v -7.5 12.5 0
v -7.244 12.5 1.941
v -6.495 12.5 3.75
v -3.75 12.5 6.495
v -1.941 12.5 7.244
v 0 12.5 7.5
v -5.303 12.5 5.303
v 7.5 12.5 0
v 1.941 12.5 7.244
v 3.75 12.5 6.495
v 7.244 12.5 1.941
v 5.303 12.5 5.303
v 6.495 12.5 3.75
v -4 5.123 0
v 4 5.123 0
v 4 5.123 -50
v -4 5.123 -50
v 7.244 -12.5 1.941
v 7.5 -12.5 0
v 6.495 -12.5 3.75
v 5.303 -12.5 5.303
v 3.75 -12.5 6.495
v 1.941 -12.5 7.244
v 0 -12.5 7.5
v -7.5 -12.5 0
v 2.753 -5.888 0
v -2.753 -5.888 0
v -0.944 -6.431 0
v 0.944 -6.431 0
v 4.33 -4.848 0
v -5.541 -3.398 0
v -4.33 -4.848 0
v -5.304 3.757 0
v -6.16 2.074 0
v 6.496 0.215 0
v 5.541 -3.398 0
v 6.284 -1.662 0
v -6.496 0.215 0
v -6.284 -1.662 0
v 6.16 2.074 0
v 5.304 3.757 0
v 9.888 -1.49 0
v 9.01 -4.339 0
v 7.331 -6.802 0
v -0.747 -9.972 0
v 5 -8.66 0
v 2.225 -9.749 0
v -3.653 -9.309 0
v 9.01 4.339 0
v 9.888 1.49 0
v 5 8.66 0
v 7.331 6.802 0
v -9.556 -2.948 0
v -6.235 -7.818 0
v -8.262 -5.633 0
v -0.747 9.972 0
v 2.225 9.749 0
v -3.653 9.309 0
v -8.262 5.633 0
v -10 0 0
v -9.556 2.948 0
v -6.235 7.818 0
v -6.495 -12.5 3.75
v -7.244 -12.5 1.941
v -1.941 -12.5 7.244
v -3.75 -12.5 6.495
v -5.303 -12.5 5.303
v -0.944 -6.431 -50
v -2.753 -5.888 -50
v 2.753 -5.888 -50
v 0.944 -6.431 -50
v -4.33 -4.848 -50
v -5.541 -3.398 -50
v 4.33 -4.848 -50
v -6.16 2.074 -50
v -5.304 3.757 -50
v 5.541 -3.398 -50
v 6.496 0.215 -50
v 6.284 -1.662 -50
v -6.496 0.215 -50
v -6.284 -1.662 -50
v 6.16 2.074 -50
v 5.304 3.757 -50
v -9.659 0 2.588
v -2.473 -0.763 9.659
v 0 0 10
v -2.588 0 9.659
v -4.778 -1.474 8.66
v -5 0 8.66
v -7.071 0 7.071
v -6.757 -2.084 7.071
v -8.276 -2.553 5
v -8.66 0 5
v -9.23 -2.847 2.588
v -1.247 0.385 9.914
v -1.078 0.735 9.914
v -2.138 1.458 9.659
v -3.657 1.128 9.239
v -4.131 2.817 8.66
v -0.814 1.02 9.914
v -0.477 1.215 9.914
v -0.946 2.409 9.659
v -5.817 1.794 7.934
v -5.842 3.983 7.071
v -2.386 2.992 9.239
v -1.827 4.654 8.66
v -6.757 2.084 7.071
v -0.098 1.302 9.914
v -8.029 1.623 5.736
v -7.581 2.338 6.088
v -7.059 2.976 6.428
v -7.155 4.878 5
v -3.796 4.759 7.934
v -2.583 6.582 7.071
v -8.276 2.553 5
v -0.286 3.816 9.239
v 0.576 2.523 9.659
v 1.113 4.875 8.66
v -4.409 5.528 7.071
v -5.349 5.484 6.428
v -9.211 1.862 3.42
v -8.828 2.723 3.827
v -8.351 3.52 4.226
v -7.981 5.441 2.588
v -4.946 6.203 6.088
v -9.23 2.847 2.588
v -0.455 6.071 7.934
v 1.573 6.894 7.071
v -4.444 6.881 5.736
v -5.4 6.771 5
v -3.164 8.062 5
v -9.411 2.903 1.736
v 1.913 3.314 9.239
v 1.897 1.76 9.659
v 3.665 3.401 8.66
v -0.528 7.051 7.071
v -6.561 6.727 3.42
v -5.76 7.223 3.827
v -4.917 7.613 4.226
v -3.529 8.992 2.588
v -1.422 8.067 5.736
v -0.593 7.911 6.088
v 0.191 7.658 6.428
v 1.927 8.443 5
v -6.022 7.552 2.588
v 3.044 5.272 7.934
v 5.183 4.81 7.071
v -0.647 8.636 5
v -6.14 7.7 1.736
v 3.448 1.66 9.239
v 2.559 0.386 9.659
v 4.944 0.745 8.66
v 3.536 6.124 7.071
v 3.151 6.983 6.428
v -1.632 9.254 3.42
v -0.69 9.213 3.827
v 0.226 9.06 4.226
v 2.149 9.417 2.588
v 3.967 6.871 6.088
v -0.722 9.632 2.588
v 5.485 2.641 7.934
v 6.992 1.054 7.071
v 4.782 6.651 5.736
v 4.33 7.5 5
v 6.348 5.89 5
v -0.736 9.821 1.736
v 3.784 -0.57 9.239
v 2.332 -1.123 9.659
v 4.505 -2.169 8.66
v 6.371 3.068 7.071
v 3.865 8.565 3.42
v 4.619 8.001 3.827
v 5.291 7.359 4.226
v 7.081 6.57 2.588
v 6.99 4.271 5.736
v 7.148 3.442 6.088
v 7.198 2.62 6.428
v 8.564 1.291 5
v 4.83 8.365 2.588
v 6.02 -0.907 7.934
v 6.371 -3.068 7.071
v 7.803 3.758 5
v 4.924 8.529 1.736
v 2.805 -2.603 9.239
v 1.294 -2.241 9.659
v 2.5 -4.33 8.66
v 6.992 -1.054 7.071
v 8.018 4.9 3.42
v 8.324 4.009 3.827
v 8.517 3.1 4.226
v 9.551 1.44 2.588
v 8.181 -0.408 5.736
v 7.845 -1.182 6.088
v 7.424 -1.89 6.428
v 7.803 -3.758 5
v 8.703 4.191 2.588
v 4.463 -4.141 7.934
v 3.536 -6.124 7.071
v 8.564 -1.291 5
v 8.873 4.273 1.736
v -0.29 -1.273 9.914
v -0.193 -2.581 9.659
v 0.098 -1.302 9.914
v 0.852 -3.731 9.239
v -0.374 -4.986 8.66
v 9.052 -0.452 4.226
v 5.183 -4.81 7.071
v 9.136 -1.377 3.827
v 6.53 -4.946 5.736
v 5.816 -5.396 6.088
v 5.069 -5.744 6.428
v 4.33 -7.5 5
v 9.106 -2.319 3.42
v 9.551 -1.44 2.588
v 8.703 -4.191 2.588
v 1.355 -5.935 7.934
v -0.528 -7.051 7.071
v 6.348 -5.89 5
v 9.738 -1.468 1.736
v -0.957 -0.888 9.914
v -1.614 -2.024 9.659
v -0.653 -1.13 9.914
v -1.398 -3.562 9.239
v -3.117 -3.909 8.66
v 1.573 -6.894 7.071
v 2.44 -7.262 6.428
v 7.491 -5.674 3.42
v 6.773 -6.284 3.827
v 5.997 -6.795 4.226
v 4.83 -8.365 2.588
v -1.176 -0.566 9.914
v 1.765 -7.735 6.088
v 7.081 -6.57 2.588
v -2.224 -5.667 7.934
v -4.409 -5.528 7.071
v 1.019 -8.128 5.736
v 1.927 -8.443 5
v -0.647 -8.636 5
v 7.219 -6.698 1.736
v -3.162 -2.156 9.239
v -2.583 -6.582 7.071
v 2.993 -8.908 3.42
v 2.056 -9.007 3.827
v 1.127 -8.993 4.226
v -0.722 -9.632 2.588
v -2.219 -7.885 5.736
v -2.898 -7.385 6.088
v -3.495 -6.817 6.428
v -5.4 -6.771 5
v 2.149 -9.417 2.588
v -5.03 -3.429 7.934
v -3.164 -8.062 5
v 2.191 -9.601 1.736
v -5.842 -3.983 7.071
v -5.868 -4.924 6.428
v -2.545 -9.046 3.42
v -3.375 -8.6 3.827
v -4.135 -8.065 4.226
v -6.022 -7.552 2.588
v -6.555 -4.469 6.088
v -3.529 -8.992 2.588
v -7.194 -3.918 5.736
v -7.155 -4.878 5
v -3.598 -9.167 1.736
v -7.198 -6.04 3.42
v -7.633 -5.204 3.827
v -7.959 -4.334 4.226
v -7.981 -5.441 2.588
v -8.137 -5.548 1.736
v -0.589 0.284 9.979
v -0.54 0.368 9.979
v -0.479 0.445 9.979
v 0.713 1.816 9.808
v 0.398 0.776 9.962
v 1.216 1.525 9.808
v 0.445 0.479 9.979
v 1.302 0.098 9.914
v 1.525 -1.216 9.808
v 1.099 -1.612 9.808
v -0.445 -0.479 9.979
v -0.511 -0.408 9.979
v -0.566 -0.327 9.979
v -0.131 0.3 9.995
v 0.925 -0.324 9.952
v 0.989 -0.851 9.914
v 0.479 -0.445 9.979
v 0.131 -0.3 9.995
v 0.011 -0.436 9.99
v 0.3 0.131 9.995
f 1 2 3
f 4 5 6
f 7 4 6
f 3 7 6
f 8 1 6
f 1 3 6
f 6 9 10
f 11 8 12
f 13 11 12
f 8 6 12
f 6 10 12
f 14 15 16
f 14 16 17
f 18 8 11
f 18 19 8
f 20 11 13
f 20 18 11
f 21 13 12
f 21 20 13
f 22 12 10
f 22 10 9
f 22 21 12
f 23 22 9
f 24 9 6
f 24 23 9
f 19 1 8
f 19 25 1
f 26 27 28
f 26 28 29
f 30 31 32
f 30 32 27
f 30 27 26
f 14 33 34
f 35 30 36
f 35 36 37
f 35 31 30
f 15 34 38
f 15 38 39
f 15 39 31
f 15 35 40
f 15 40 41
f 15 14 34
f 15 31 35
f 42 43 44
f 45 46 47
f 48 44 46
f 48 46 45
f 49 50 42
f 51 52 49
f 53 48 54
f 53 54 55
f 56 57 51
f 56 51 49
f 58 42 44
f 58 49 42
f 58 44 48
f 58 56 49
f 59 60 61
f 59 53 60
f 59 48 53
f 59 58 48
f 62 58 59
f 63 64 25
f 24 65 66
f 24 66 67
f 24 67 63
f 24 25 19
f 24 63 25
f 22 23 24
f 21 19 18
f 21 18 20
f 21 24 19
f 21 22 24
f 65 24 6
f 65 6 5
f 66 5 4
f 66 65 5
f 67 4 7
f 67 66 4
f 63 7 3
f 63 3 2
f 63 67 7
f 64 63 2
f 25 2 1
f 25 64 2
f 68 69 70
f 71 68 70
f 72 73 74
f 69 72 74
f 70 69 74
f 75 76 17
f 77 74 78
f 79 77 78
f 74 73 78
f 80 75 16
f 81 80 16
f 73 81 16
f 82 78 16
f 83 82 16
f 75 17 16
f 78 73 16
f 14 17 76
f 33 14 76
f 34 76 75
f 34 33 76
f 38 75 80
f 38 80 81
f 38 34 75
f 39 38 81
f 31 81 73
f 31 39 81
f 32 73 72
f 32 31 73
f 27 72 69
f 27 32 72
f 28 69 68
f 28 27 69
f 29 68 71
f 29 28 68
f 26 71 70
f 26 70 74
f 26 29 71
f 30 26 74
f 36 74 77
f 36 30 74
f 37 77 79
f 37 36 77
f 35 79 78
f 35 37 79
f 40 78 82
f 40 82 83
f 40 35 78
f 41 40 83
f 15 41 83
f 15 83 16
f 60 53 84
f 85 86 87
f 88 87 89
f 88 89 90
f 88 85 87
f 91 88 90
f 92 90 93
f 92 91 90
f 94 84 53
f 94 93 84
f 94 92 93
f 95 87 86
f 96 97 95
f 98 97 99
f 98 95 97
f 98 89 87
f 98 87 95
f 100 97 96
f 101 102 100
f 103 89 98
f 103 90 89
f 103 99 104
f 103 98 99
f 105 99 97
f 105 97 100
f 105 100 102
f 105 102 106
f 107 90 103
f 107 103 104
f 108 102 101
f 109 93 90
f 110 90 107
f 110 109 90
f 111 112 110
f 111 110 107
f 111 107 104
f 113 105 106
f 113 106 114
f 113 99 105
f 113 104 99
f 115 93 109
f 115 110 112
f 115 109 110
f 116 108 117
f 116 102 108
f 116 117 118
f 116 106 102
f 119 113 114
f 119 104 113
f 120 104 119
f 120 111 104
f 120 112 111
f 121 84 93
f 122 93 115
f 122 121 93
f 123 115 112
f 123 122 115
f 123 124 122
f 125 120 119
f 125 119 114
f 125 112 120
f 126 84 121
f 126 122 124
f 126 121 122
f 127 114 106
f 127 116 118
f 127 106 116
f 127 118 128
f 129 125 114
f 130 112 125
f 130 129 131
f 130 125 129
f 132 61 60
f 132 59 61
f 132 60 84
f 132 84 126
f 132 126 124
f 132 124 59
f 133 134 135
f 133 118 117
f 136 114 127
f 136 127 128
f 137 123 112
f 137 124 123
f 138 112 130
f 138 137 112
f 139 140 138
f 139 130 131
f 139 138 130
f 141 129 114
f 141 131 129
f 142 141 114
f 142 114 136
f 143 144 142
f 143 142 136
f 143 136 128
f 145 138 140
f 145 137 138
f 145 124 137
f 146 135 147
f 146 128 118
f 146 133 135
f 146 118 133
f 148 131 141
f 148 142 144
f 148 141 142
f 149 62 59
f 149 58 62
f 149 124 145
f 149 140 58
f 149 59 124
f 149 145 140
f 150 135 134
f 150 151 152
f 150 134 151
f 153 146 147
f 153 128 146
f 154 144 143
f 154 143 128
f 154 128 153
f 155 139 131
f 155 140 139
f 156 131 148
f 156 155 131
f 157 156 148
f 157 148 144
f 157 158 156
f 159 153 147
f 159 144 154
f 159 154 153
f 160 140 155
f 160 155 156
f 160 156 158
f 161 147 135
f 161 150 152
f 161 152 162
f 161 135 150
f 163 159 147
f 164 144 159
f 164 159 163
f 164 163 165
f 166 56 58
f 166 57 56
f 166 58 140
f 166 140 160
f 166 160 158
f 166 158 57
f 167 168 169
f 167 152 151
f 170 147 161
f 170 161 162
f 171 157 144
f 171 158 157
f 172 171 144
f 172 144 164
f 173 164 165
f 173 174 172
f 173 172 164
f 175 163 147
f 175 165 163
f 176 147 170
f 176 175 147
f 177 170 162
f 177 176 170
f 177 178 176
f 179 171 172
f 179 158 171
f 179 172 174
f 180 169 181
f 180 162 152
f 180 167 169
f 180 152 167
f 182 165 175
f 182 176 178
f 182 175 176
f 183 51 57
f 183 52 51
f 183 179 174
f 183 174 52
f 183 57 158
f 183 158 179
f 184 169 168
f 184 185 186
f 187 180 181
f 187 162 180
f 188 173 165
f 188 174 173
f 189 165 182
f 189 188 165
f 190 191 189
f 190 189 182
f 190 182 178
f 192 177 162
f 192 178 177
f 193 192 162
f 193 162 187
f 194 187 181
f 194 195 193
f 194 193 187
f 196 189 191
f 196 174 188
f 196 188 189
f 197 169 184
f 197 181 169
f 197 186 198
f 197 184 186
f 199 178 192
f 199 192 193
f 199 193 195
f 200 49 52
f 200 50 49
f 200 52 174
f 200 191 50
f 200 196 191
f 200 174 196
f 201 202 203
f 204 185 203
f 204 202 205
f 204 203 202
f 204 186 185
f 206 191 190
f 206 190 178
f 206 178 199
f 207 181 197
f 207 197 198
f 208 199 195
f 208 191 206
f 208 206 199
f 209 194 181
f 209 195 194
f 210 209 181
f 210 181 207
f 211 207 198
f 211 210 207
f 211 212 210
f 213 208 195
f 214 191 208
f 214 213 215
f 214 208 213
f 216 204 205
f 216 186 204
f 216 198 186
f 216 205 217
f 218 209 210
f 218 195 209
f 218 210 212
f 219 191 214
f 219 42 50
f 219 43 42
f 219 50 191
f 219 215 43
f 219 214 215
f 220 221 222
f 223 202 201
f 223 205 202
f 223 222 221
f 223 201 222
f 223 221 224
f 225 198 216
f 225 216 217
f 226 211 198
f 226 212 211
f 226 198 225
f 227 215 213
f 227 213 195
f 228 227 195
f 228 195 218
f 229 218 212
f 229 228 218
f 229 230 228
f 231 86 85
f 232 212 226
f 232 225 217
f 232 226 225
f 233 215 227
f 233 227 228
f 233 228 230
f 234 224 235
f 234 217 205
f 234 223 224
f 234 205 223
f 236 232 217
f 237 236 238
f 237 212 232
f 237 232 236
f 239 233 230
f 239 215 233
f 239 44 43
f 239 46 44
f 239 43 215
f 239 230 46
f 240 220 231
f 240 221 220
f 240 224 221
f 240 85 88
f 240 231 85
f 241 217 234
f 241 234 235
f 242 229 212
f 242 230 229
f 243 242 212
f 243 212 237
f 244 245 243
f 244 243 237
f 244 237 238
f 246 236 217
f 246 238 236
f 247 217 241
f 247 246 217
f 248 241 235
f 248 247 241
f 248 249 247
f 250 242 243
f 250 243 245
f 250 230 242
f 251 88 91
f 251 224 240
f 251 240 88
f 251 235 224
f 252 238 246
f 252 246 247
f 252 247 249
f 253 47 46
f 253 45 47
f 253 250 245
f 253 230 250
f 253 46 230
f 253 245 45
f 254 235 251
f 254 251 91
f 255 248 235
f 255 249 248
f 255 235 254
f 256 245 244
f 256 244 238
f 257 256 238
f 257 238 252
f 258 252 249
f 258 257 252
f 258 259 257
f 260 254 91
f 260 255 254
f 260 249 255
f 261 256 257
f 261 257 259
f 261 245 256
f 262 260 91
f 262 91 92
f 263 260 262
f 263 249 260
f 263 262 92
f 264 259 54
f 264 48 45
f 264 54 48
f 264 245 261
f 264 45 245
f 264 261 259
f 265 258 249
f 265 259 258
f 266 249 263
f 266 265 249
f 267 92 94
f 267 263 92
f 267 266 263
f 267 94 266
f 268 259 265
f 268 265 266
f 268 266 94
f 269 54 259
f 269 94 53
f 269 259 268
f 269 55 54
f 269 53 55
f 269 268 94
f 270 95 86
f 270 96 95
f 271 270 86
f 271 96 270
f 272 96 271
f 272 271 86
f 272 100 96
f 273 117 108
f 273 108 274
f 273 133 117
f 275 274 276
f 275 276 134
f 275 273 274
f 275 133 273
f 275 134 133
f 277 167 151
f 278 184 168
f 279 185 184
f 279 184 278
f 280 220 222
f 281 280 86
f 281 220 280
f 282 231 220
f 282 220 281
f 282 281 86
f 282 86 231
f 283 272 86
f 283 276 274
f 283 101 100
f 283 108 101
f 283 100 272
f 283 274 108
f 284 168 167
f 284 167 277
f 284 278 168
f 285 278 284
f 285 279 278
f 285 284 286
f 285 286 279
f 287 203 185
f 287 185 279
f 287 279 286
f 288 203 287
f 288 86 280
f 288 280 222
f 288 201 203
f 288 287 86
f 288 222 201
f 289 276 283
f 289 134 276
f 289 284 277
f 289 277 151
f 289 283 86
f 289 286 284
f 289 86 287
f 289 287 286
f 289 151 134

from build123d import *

# Parameters (mm, degrees)
F3_DEPTH = 50
F5_DEPTH = 12.5


with BuildPart() as f1:
    # F0 (on Front) → F1 (revolve)
    with BuildSketch(Plane.XZ):
        with BuildLine():
            Line((0, 0), (0, 10))
            ThreePointArc((0, 10), (-7.071068, 7.071068), (-10, 0))
            Line((-10, 0), (0, 0))
        make_face()
    revolve(axis=Axis((0, 0, 5), (0, 0, -1)))


with BuildPart() as f3:
    # F2 (on Top) → F3 (new body)
    with BuildSketch(Plane.XY):
        with BuildLine():
            Line((4, 5.123475), (-4, 5.123475))
            ThreePointArc((-4, 5.123475), (0, -6.5), (4, 5.123475))
        make_face()
    extrude(amount=-F3_DEPTH)


with BuildPart() as f5:
    # F4 (on Front) → F5 (new body, symmetric)
    with BuildSketch(Plane.XZ):
        with BuildLine():
            ThreePointArc((7.5, 0), (5.303301, 5.303301), (0, 7.5))
            ThreePointArc((0, 7.5), (-5.303301, 5.303301), (-7.5, 0))
            Line((-7.5, 0), (7.5, 0))
        make_face()
    extrude(amount=F5_DEPTH, both=True)


solid = Compound([f1.part, f3.part, f5.part])
